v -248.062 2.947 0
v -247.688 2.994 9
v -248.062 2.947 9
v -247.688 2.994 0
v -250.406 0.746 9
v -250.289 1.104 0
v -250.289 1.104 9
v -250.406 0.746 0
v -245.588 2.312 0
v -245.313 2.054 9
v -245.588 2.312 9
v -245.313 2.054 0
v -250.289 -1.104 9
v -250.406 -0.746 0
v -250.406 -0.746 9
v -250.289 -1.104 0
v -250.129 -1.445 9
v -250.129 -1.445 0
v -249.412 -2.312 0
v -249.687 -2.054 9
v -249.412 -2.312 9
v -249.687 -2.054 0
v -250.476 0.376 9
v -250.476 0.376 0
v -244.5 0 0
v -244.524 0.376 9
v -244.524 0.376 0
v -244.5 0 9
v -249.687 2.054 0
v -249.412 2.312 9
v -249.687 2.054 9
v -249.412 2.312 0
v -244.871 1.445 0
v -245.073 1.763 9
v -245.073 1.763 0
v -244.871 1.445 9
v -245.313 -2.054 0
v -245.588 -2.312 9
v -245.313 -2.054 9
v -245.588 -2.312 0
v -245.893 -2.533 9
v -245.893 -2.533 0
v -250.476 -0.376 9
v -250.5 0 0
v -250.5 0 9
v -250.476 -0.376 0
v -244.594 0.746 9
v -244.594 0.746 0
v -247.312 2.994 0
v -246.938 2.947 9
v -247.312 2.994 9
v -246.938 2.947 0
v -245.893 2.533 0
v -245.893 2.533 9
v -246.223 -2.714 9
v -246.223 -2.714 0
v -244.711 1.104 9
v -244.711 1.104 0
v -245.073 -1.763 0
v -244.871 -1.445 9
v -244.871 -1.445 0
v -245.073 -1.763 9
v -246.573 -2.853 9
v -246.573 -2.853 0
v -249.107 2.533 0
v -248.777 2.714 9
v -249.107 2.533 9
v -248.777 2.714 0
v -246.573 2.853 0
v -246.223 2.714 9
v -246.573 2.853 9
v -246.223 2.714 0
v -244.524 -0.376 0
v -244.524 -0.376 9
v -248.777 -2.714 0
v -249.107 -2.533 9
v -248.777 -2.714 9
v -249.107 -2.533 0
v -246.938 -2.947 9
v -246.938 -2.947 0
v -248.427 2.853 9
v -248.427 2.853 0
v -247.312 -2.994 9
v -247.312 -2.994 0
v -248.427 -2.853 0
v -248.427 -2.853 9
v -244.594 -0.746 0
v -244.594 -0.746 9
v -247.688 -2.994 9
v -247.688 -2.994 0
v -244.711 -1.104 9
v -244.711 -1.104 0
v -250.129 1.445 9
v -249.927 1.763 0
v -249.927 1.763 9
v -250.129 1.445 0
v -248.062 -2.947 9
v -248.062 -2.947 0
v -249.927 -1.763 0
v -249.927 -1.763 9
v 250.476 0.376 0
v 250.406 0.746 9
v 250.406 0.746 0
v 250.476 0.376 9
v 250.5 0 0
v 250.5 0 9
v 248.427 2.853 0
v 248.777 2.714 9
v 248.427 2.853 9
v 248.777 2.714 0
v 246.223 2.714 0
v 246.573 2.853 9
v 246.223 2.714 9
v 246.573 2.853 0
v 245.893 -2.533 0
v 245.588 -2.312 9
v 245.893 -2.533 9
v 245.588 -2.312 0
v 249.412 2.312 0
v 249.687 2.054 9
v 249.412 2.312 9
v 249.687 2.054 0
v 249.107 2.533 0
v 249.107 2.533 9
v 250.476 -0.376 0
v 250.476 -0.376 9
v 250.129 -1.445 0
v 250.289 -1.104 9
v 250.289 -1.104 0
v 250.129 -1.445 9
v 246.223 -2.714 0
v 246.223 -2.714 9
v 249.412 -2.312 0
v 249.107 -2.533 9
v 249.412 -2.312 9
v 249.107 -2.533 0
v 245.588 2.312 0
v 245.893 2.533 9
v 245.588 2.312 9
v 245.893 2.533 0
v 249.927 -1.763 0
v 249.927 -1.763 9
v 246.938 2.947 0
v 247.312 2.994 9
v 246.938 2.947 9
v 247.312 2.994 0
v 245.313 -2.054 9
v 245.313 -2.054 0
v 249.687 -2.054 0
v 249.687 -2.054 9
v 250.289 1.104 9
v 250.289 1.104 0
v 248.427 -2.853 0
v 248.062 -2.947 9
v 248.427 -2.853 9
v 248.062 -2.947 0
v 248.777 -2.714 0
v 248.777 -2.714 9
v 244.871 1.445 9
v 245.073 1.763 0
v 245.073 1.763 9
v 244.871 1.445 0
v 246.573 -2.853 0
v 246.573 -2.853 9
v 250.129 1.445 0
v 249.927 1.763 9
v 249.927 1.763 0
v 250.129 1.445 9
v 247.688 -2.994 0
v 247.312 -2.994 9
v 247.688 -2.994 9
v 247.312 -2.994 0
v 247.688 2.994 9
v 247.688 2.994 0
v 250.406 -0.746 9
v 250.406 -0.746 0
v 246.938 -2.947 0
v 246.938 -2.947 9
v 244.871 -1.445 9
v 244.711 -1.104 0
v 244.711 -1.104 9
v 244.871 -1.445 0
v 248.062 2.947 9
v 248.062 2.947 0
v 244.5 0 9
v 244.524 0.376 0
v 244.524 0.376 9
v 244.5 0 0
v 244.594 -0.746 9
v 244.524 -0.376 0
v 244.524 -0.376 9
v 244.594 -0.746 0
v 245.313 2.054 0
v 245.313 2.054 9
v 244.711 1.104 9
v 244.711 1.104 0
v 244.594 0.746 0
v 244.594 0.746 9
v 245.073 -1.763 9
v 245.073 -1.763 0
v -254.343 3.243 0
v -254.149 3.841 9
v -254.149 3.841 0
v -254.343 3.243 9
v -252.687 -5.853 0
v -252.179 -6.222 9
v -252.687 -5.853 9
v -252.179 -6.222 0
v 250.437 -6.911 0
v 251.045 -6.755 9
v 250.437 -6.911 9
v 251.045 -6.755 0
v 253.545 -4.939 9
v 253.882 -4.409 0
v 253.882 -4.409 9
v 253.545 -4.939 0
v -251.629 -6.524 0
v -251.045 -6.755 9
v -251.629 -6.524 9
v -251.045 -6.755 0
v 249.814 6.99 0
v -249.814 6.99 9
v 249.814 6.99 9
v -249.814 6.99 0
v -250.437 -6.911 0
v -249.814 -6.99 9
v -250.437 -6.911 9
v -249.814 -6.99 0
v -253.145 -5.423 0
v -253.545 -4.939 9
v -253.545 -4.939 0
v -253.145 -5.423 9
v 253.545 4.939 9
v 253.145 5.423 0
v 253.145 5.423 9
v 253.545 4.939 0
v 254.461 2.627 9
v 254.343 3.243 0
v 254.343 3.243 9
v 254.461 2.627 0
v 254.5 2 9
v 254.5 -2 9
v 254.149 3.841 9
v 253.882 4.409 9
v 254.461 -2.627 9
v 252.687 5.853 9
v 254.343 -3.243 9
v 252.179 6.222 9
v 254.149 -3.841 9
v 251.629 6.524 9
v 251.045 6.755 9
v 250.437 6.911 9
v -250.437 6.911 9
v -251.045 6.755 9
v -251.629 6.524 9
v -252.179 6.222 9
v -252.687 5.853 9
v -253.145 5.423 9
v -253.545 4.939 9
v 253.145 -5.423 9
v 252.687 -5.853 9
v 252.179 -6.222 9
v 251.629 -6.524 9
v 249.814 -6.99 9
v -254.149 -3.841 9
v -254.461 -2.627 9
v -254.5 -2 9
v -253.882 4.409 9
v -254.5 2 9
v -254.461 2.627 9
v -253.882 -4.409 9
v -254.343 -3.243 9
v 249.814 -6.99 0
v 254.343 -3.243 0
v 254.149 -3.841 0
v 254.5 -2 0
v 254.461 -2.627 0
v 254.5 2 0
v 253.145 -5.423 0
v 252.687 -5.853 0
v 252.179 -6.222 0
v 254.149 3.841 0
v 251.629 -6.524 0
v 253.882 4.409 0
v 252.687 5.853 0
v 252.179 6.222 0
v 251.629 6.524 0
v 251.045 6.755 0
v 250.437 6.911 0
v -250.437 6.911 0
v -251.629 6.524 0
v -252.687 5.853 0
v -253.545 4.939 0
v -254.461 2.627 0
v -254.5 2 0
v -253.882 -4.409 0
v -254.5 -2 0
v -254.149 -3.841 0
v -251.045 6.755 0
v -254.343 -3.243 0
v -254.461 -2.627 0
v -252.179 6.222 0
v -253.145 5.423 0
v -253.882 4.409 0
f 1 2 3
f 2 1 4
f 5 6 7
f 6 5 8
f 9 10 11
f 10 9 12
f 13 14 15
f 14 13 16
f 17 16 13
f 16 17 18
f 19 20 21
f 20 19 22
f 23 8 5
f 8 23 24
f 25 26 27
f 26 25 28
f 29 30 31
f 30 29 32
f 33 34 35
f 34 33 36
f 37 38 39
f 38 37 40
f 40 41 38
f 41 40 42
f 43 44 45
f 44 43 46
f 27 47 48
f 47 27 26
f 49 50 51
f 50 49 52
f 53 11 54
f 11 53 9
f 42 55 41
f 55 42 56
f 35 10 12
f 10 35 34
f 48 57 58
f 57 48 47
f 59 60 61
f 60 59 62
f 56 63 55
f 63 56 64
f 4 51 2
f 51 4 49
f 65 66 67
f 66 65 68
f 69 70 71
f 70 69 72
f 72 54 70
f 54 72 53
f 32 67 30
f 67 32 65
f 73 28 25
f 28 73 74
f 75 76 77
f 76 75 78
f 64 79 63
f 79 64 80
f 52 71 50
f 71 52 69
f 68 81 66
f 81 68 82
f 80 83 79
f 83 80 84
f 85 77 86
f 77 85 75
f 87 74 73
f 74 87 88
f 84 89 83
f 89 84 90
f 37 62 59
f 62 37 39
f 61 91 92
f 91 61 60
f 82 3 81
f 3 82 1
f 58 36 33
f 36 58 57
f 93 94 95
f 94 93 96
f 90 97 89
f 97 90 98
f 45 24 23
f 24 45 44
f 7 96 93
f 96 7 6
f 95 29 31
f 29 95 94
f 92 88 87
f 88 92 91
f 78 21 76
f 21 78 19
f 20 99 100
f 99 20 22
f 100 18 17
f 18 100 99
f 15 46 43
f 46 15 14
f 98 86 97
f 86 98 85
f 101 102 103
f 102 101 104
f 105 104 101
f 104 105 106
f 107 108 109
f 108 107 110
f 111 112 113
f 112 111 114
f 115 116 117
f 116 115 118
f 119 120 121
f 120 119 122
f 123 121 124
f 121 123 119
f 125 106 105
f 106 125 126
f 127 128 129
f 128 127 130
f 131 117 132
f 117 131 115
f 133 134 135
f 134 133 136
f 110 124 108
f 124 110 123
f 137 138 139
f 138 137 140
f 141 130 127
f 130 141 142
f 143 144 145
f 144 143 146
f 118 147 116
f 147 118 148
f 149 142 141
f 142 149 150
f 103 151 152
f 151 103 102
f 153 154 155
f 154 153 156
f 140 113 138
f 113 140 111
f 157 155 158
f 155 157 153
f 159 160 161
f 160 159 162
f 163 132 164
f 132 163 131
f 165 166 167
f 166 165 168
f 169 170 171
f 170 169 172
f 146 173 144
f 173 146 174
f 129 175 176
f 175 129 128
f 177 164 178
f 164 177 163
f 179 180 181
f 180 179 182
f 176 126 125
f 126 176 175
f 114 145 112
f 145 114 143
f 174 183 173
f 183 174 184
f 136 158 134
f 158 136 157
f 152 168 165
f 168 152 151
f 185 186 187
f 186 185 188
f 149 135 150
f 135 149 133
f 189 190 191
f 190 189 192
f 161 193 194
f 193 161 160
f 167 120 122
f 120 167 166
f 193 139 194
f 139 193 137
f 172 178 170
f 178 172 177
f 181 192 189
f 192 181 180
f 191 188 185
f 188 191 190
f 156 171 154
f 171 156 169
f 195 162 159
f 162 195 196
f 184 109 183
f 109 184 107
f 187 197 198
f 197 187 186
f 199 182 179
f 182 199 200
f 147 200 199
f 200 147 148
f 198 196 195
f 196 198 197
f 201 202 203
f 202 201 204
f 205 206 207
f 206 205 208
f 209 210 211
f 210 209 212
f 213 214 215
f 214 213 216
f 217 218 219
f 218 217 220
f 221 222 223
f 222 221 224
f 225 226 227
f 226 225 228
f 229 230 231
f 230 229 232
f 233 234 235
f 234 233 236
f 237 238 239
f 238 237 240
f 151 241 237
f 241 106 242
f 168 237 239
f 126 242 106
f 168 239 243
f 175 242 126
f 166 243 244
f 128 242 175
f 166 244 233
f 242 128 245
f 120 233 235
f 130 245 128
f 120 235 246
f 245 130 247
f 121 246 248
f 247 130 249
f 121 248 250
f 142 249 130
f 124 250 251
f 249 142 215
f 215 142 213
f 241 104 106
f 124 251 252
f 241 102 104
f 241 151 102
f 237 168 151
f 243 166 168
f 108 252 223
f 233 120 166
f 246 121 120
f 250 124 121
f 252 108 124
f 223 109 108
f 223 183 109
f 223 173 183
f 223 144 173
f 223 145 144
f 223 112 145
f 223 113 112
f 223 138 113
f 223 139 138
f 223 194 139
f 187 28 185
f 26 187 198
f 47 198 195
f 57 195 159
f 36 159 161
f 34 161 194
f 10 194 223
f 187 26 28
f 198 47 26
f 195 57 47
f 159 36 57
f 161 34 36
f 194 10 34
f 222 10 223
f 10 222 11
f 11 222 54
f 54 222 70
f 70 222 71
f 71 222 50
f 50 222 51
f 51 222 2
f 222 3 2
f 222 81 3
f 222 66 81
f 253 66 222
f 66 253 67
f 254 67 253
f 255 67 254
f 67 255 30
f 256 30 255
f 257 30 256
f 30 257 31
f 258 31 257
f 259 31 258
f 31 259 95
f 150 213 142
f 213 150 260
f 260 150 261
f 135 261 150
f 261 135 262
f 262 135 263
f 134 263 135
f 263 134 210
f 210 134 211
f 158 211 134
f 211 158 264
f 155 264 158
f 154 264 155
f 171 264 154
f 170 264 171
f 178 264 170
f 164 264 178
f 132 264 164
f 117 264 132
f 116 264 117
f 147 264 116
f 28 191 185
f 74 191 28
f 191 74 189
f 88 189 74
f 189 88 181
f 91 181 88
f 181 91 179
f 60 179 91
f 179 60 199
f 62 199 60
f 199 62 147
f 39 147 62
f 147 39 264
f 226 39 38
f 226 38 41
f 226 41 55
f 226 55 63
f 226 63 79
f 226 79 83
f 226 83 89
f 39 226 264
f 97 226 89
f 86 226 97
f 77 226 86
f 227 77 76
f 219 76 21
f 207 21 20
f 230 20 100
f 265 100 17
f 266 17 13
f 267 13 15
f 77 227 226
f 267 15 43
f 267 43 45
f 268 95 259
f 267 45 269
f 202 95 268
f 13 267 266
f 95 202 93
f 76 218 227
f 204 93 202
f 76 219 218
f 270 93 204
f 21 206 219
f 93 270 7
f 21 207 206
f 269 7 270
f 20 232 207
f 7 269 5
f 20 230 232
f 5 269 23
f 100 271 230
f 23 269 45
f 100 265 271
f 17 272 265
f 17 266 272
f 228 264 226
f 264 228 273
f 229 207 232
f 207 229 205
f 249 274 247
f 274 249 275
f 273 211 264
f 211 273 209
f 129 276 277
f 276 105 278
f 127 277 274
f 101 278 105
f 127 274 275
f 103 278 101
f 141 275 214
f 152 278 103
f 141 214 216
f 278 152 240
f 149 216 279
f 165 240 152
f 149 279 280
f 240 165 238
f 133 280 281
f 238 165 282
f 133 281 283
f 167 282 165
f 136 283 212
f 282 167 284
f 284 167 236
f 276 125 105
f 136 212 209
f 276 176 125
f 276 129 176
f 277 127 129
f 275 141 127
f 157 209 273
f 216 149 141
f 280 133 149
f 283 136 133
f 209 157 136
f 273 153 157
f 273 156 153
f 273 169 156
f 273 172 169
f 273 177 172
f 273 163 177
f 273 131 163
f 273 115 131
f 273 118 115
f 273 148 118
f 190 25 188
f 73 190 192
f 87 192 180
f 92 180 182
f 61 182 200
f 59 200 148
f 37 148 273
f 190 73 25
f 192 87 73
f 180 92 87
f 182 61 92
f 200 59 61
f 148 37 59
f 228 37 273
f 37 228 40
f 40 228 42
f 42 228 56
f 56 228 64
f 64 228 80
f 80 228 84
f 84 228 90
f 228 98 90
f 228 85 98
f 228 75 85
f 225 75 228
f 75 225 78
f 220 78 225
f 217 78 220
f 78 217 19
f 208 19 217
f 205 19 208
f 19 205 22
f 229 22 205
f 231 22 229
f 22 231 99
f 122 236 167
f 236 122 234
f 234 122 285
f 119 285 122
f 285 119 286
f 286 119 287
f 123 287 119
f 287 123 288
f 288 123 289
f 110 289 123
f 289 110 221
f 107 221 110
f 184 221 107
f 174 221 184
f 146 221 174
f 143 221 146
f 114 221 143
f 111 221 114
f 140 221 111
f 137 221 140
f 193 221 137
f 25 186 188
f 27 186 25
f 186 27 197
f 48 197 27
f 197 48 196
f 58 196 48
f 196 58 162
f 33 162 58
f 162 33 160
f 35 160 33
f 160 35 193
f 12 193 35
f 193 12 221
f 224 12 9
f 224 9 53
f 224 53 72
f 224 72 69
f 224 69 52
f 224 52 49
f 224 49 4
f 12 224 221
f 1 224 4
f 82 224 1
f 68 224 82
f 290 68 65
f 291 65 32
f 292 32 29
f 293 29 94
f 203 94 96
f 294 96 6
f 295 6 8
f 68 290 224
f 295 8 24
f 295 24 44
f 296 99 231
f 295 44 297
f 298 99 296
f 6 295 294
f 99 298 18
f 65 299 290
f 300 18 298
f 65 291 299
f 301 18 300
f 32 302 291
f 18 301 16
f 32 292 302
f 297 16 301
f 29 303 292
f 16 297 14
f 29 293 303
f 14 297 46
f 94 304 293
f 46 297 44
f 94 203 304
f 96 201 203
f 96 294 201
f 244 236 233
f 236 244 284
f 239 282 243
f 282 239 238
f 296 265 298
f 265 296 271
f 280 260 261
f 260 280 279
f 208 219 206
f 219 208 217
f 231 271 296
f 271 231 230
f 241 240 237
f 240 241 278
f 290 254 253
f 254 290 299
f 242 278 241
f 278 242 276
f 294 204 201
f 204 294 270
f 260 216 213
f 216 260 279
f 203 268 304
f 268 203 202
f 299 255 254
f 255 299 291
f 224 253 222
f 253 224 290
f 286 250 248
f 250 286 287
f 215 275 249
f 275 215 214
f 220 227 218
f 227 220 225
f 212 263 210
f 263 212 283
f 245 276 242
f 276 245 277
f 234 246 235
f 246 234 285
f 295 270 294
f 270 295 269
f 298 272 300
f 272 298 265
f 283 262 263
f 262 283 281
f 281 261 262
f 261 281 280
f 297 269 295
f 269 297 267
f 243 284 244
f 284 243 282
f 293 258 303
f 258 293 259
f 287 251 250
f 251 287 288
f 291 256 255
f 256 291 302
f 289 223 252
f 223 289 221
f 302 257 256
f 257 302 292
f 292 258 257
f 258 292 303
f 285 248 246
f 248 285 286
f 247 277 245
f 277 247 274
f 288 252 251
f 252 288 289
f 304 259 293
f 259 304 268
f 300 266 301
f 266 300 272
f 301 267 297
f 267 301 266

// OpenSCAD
$fn = 50;


difference() {
	union() {
		hull() {
			translate(v = [-249.5000000000, 2.0000000000, 0]) {
				cylinder(h = 9, r = 5);
			}
			translate(v = [249.5000000000, 2.0000000000, 0]) {
				cylinder(h = 9, r = 5);
			}
			translate(v = [-249.5000000000, -2.0000000000, 0]) {
				cylinder(h = 9, r = 5);
			}
			translate(v = [249.5000000000, -2.0000000000, 0]) {
				cylinder(h = 9, r = 5);
			}
		}
	}
	union() {
		translate(v = [-247.5000000000, 0.0000000000, -100.0000000000]) {
			cylinder(h = 200, r = 3.0000000000);
		}
		translate(v = [-247.5000000000, 0.0000000000, -100.0000000000]) {
			cylinder(h = 200, r = 3.0000000000);
		}
		translate(v = [247.5000000000, 0.0000000000, -100.0000000000]) {
			cylinder(h = 200, r = 3.0000000000);
		}
		translate(v = [247.5000000000, 0.0000000000, -100.0000000000]) {
			cylinder(h = 200, r = 3.0000000000);
		}
	}
}
